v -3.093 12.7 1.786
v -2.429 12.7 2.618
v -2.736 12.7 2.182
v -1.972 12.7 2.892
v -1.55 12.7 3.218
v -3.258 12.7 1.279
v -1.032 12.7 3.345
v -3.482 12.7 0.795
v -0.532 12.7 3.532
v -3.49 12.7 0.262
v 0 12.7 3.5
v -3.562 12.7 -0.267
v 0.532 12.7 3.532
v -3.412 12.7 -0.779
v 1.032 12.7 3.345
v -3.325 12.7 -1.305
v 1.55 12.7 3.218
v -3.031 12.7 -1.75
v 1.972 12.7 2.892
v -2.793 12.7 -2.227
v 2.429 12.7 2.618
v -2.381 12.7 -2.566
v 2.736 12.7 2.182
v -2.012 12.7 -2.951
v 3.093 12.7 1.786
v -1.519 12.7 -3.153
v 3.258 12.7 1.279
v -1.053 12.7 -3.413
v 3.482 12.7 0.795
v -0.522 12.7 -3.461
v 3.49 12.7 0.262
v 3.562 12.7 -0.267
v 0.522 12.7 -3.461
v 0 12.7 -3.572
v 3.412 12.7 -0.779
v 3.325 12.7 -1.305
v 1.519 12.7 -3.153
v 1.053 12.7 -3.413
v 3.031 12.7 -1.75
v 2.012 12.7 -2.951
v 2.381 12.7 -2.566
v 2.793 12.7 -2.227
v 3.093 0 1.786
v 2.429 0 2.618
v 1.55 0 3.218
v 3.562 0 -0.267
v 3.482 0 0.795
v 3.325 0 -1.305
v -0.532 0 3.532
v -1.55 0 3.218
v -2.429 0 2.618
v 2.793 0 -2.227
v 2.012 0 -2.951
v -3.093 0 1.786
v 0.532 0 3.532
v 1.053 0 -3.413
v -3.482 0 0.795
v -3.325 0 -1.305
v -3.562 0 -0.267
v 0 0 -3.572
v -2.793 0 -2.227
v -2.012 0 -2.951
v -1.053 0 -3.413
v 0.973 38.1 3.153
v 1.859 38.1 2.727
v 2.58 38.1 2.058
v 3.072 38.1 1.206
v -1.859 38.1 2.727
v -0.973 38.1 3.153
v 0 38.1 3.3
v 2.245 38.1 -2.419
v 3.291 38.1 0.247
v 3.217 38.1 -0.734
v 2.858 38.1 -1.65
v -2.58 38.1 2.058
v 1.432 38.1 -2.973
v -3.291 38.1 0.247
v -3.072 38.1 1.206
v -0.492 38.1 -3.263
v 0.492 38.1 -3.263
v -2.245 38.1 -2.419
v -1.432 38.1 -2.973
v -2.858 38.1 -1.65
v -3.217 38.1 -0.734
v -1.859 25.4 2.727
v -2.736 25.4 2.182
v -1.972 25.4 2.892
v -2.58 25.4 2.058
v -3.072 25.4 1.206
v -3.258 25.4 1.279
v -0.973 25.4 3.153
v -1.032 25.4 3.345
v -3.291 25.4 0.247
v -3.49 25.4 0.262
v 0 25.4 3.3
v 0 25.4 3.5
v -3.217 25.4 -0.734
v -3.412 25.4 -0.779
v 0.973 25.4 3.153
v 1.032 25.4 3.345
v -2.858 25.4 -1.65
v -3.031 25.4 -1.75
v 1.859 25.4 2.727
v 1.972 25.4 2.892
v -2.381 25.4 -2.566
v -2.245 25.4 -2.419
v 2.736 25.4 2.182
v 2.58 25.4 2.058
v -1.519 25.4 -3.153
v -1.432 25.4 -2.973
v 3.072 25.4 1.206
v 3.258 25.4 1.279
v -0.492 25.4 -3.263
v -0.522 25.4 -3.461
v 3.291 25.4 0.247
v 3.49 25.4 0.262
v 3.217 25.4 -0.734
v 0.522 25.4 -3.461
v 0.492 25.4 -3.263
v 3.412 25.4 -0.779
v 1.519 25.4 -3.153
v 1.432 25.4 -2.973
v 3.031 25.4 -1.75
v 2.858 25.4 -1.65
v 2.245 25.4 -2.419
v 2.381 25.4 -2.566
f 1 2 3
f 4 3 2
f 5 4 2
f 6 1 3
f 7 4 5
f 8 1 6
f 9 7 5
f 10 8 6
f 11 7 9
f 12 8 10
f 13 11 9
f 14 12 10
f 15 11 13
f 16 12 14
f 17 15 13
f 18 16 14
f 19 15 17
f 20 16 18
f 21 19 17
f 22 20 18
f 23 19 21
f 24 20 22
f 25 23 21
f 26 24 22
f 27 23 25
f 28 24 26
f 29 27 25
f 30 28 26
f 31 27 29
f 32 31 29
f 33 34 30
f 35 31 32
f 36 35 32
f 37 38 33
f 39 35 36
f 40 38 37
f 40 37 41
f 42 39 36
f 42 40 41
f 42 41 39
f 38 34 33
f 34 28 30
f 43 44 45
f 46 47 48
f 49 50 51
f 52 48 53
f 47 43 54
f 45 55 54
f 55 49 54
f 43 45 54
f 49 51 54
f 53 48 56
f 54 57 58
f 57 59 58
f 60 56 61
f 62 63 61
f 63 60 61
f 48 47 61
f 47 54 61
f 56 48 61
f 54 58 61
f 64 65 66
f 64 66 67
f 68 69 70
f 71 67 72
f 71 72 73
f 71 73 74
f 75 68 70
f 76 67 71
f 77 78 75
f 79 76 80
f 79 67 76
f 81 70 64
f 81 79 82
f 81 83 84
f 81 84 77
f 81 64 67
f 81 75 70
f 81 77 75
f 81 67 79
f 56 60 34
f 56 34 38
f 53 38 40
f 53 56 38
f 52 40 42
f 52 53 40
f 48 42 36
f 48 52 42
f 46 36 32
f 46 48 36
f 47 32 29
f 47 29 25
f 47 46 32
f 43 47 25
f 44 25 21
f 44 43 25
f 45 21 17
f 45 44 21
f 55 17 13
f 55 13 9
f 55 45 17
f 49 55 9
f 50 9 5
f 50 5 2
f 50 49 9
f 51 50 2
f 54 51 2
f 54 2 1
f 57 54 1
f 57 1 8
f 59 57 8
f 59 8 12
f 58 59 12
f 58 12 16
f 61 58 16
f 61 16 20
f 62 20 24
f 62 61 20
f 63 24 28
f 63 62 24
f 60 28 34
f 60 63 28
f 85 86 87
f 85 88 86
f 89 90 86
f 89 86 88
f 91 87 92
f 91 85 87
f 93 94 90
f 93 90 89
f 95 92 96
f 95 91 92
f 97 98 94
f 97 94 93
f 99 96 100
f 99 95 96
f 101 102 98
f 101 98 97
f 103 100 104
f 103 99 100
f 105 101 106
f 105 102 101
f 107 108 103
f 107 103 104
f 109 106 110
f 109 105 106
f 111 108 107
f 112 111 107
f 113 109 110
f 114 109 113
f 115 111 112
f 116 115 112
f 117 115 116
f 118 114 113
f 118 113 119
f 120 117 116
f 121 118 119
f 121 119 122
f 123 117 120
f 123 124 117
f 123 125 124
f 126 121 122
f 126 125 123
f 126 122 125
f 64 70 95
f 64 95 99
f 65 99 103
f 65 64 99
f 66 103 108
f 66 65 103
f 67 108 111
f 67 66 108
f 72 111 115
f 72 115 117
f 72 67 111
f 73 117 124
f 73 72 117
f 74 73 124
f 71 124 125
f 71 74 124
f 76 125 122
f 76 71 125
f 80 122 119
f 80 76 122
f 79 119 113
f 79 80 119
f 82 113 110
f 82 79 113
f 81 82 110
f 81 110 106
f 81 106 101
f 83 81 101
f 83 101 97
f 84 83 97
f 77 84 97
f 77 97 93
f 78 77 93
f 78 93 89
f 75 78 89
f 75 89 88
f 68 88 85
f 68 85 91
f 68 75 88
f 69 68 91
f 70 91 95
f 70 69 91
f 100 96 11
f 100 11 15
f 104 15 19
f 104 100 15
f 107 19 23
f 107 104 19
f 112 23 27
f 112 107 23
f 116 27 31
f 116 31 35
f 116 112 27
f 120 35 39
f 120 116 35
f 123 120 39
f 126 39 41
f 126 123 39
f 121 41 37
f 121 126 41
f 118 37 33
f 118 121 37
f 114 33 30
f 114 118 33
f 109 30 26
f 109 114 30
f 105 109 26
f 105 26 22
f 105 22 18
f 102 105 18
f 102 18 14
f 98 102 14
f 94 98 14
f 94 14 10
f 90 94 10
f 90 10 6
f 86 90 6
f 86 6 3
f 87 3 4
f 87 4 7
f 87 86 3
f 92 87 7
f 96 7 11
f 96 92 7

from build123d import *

# Parameters (mm, degrees)
SKETCH1_R           = 4.7625
BOSS_EXTRUDE1_DEPTH = 38.1
SKETCH2_R           = 5.832464333
SKETCH2_R_2         = 3.3
CUT_EXTRUDE1_DEPTH  = 12.7
SKETCH3_R           = 5.346562202
SKETCH3_R_2         = 3.5
CUT_EXTRUDE2_DEPTH  = 12.7
SKETCH4_R           = 4.91764208
SKETCH4_R_2         = 3.571875
CUT_EXTRUDE3_DEPTH  = 12.7


with BuildPart() as part:
    # Sketch1 → Boss-Extrude1 (new body)
    with BuildSketch(Plane(origin=(0, 0, 0), x_dir=(1, 0, 0), z_dir=(0, 1, 0))):
        with Locations(Location((0, 0, 0), (0, 0, 90))):
            Circle(SKETCH1_R)
    extrude(amount=BOSS_EXTRUDE1_DEPTH)

    # Sketch2 → Cut-Extrude1 (cut)
    with BuildSketch(Plane(origin=(0, 38.1, 0), x_dir=(1, 0, 0), z_dir=(0, 1, 0))):
        Circle(SKETCH2_R)
        with Locations(Location((0, 0, 0), (0, 0, 270))):
            Circle(SKETCH2_R_2, mode=Mode.SUBTRACT)
    extrude(amount=-CUT_EXTRUDE1_DEPTH, mode=Mode.SUBTRACT)

    # Sketch3 → Cut-Extrude2 (cut)
    with BuildSketch(Plane(origin=(0, 25.4, 0), x_dir=(1, 0, 0), z_dir=(0, 1, 0))):
        Circle(SKETCH3_R)
        with Locations(Location((0, 0, 0), (0, 0, 270))):
            Circle(SKETCH3_R_2, mode=Mode.SUBTRACT)
    extrude(amount=-CUT_EXTRUDE2_DEPTH, mode=Mode.SUBTRACT)

    # Sketch4 → Cut-Extrude3 (cut)
    with BuildSketch(Plane.XZ):
        Circle(SKETCH4_R)
        with Locations(Location((0, 0, 0), (0, 0, 270))):
            Circle(SKETCH4_R_2, mode=Mode.SUBTRACT)
    extrude(amount=-CUT_EXTRUDE3_DEPTH, mode=Mode.SUBTRACT)


solid = part.part
